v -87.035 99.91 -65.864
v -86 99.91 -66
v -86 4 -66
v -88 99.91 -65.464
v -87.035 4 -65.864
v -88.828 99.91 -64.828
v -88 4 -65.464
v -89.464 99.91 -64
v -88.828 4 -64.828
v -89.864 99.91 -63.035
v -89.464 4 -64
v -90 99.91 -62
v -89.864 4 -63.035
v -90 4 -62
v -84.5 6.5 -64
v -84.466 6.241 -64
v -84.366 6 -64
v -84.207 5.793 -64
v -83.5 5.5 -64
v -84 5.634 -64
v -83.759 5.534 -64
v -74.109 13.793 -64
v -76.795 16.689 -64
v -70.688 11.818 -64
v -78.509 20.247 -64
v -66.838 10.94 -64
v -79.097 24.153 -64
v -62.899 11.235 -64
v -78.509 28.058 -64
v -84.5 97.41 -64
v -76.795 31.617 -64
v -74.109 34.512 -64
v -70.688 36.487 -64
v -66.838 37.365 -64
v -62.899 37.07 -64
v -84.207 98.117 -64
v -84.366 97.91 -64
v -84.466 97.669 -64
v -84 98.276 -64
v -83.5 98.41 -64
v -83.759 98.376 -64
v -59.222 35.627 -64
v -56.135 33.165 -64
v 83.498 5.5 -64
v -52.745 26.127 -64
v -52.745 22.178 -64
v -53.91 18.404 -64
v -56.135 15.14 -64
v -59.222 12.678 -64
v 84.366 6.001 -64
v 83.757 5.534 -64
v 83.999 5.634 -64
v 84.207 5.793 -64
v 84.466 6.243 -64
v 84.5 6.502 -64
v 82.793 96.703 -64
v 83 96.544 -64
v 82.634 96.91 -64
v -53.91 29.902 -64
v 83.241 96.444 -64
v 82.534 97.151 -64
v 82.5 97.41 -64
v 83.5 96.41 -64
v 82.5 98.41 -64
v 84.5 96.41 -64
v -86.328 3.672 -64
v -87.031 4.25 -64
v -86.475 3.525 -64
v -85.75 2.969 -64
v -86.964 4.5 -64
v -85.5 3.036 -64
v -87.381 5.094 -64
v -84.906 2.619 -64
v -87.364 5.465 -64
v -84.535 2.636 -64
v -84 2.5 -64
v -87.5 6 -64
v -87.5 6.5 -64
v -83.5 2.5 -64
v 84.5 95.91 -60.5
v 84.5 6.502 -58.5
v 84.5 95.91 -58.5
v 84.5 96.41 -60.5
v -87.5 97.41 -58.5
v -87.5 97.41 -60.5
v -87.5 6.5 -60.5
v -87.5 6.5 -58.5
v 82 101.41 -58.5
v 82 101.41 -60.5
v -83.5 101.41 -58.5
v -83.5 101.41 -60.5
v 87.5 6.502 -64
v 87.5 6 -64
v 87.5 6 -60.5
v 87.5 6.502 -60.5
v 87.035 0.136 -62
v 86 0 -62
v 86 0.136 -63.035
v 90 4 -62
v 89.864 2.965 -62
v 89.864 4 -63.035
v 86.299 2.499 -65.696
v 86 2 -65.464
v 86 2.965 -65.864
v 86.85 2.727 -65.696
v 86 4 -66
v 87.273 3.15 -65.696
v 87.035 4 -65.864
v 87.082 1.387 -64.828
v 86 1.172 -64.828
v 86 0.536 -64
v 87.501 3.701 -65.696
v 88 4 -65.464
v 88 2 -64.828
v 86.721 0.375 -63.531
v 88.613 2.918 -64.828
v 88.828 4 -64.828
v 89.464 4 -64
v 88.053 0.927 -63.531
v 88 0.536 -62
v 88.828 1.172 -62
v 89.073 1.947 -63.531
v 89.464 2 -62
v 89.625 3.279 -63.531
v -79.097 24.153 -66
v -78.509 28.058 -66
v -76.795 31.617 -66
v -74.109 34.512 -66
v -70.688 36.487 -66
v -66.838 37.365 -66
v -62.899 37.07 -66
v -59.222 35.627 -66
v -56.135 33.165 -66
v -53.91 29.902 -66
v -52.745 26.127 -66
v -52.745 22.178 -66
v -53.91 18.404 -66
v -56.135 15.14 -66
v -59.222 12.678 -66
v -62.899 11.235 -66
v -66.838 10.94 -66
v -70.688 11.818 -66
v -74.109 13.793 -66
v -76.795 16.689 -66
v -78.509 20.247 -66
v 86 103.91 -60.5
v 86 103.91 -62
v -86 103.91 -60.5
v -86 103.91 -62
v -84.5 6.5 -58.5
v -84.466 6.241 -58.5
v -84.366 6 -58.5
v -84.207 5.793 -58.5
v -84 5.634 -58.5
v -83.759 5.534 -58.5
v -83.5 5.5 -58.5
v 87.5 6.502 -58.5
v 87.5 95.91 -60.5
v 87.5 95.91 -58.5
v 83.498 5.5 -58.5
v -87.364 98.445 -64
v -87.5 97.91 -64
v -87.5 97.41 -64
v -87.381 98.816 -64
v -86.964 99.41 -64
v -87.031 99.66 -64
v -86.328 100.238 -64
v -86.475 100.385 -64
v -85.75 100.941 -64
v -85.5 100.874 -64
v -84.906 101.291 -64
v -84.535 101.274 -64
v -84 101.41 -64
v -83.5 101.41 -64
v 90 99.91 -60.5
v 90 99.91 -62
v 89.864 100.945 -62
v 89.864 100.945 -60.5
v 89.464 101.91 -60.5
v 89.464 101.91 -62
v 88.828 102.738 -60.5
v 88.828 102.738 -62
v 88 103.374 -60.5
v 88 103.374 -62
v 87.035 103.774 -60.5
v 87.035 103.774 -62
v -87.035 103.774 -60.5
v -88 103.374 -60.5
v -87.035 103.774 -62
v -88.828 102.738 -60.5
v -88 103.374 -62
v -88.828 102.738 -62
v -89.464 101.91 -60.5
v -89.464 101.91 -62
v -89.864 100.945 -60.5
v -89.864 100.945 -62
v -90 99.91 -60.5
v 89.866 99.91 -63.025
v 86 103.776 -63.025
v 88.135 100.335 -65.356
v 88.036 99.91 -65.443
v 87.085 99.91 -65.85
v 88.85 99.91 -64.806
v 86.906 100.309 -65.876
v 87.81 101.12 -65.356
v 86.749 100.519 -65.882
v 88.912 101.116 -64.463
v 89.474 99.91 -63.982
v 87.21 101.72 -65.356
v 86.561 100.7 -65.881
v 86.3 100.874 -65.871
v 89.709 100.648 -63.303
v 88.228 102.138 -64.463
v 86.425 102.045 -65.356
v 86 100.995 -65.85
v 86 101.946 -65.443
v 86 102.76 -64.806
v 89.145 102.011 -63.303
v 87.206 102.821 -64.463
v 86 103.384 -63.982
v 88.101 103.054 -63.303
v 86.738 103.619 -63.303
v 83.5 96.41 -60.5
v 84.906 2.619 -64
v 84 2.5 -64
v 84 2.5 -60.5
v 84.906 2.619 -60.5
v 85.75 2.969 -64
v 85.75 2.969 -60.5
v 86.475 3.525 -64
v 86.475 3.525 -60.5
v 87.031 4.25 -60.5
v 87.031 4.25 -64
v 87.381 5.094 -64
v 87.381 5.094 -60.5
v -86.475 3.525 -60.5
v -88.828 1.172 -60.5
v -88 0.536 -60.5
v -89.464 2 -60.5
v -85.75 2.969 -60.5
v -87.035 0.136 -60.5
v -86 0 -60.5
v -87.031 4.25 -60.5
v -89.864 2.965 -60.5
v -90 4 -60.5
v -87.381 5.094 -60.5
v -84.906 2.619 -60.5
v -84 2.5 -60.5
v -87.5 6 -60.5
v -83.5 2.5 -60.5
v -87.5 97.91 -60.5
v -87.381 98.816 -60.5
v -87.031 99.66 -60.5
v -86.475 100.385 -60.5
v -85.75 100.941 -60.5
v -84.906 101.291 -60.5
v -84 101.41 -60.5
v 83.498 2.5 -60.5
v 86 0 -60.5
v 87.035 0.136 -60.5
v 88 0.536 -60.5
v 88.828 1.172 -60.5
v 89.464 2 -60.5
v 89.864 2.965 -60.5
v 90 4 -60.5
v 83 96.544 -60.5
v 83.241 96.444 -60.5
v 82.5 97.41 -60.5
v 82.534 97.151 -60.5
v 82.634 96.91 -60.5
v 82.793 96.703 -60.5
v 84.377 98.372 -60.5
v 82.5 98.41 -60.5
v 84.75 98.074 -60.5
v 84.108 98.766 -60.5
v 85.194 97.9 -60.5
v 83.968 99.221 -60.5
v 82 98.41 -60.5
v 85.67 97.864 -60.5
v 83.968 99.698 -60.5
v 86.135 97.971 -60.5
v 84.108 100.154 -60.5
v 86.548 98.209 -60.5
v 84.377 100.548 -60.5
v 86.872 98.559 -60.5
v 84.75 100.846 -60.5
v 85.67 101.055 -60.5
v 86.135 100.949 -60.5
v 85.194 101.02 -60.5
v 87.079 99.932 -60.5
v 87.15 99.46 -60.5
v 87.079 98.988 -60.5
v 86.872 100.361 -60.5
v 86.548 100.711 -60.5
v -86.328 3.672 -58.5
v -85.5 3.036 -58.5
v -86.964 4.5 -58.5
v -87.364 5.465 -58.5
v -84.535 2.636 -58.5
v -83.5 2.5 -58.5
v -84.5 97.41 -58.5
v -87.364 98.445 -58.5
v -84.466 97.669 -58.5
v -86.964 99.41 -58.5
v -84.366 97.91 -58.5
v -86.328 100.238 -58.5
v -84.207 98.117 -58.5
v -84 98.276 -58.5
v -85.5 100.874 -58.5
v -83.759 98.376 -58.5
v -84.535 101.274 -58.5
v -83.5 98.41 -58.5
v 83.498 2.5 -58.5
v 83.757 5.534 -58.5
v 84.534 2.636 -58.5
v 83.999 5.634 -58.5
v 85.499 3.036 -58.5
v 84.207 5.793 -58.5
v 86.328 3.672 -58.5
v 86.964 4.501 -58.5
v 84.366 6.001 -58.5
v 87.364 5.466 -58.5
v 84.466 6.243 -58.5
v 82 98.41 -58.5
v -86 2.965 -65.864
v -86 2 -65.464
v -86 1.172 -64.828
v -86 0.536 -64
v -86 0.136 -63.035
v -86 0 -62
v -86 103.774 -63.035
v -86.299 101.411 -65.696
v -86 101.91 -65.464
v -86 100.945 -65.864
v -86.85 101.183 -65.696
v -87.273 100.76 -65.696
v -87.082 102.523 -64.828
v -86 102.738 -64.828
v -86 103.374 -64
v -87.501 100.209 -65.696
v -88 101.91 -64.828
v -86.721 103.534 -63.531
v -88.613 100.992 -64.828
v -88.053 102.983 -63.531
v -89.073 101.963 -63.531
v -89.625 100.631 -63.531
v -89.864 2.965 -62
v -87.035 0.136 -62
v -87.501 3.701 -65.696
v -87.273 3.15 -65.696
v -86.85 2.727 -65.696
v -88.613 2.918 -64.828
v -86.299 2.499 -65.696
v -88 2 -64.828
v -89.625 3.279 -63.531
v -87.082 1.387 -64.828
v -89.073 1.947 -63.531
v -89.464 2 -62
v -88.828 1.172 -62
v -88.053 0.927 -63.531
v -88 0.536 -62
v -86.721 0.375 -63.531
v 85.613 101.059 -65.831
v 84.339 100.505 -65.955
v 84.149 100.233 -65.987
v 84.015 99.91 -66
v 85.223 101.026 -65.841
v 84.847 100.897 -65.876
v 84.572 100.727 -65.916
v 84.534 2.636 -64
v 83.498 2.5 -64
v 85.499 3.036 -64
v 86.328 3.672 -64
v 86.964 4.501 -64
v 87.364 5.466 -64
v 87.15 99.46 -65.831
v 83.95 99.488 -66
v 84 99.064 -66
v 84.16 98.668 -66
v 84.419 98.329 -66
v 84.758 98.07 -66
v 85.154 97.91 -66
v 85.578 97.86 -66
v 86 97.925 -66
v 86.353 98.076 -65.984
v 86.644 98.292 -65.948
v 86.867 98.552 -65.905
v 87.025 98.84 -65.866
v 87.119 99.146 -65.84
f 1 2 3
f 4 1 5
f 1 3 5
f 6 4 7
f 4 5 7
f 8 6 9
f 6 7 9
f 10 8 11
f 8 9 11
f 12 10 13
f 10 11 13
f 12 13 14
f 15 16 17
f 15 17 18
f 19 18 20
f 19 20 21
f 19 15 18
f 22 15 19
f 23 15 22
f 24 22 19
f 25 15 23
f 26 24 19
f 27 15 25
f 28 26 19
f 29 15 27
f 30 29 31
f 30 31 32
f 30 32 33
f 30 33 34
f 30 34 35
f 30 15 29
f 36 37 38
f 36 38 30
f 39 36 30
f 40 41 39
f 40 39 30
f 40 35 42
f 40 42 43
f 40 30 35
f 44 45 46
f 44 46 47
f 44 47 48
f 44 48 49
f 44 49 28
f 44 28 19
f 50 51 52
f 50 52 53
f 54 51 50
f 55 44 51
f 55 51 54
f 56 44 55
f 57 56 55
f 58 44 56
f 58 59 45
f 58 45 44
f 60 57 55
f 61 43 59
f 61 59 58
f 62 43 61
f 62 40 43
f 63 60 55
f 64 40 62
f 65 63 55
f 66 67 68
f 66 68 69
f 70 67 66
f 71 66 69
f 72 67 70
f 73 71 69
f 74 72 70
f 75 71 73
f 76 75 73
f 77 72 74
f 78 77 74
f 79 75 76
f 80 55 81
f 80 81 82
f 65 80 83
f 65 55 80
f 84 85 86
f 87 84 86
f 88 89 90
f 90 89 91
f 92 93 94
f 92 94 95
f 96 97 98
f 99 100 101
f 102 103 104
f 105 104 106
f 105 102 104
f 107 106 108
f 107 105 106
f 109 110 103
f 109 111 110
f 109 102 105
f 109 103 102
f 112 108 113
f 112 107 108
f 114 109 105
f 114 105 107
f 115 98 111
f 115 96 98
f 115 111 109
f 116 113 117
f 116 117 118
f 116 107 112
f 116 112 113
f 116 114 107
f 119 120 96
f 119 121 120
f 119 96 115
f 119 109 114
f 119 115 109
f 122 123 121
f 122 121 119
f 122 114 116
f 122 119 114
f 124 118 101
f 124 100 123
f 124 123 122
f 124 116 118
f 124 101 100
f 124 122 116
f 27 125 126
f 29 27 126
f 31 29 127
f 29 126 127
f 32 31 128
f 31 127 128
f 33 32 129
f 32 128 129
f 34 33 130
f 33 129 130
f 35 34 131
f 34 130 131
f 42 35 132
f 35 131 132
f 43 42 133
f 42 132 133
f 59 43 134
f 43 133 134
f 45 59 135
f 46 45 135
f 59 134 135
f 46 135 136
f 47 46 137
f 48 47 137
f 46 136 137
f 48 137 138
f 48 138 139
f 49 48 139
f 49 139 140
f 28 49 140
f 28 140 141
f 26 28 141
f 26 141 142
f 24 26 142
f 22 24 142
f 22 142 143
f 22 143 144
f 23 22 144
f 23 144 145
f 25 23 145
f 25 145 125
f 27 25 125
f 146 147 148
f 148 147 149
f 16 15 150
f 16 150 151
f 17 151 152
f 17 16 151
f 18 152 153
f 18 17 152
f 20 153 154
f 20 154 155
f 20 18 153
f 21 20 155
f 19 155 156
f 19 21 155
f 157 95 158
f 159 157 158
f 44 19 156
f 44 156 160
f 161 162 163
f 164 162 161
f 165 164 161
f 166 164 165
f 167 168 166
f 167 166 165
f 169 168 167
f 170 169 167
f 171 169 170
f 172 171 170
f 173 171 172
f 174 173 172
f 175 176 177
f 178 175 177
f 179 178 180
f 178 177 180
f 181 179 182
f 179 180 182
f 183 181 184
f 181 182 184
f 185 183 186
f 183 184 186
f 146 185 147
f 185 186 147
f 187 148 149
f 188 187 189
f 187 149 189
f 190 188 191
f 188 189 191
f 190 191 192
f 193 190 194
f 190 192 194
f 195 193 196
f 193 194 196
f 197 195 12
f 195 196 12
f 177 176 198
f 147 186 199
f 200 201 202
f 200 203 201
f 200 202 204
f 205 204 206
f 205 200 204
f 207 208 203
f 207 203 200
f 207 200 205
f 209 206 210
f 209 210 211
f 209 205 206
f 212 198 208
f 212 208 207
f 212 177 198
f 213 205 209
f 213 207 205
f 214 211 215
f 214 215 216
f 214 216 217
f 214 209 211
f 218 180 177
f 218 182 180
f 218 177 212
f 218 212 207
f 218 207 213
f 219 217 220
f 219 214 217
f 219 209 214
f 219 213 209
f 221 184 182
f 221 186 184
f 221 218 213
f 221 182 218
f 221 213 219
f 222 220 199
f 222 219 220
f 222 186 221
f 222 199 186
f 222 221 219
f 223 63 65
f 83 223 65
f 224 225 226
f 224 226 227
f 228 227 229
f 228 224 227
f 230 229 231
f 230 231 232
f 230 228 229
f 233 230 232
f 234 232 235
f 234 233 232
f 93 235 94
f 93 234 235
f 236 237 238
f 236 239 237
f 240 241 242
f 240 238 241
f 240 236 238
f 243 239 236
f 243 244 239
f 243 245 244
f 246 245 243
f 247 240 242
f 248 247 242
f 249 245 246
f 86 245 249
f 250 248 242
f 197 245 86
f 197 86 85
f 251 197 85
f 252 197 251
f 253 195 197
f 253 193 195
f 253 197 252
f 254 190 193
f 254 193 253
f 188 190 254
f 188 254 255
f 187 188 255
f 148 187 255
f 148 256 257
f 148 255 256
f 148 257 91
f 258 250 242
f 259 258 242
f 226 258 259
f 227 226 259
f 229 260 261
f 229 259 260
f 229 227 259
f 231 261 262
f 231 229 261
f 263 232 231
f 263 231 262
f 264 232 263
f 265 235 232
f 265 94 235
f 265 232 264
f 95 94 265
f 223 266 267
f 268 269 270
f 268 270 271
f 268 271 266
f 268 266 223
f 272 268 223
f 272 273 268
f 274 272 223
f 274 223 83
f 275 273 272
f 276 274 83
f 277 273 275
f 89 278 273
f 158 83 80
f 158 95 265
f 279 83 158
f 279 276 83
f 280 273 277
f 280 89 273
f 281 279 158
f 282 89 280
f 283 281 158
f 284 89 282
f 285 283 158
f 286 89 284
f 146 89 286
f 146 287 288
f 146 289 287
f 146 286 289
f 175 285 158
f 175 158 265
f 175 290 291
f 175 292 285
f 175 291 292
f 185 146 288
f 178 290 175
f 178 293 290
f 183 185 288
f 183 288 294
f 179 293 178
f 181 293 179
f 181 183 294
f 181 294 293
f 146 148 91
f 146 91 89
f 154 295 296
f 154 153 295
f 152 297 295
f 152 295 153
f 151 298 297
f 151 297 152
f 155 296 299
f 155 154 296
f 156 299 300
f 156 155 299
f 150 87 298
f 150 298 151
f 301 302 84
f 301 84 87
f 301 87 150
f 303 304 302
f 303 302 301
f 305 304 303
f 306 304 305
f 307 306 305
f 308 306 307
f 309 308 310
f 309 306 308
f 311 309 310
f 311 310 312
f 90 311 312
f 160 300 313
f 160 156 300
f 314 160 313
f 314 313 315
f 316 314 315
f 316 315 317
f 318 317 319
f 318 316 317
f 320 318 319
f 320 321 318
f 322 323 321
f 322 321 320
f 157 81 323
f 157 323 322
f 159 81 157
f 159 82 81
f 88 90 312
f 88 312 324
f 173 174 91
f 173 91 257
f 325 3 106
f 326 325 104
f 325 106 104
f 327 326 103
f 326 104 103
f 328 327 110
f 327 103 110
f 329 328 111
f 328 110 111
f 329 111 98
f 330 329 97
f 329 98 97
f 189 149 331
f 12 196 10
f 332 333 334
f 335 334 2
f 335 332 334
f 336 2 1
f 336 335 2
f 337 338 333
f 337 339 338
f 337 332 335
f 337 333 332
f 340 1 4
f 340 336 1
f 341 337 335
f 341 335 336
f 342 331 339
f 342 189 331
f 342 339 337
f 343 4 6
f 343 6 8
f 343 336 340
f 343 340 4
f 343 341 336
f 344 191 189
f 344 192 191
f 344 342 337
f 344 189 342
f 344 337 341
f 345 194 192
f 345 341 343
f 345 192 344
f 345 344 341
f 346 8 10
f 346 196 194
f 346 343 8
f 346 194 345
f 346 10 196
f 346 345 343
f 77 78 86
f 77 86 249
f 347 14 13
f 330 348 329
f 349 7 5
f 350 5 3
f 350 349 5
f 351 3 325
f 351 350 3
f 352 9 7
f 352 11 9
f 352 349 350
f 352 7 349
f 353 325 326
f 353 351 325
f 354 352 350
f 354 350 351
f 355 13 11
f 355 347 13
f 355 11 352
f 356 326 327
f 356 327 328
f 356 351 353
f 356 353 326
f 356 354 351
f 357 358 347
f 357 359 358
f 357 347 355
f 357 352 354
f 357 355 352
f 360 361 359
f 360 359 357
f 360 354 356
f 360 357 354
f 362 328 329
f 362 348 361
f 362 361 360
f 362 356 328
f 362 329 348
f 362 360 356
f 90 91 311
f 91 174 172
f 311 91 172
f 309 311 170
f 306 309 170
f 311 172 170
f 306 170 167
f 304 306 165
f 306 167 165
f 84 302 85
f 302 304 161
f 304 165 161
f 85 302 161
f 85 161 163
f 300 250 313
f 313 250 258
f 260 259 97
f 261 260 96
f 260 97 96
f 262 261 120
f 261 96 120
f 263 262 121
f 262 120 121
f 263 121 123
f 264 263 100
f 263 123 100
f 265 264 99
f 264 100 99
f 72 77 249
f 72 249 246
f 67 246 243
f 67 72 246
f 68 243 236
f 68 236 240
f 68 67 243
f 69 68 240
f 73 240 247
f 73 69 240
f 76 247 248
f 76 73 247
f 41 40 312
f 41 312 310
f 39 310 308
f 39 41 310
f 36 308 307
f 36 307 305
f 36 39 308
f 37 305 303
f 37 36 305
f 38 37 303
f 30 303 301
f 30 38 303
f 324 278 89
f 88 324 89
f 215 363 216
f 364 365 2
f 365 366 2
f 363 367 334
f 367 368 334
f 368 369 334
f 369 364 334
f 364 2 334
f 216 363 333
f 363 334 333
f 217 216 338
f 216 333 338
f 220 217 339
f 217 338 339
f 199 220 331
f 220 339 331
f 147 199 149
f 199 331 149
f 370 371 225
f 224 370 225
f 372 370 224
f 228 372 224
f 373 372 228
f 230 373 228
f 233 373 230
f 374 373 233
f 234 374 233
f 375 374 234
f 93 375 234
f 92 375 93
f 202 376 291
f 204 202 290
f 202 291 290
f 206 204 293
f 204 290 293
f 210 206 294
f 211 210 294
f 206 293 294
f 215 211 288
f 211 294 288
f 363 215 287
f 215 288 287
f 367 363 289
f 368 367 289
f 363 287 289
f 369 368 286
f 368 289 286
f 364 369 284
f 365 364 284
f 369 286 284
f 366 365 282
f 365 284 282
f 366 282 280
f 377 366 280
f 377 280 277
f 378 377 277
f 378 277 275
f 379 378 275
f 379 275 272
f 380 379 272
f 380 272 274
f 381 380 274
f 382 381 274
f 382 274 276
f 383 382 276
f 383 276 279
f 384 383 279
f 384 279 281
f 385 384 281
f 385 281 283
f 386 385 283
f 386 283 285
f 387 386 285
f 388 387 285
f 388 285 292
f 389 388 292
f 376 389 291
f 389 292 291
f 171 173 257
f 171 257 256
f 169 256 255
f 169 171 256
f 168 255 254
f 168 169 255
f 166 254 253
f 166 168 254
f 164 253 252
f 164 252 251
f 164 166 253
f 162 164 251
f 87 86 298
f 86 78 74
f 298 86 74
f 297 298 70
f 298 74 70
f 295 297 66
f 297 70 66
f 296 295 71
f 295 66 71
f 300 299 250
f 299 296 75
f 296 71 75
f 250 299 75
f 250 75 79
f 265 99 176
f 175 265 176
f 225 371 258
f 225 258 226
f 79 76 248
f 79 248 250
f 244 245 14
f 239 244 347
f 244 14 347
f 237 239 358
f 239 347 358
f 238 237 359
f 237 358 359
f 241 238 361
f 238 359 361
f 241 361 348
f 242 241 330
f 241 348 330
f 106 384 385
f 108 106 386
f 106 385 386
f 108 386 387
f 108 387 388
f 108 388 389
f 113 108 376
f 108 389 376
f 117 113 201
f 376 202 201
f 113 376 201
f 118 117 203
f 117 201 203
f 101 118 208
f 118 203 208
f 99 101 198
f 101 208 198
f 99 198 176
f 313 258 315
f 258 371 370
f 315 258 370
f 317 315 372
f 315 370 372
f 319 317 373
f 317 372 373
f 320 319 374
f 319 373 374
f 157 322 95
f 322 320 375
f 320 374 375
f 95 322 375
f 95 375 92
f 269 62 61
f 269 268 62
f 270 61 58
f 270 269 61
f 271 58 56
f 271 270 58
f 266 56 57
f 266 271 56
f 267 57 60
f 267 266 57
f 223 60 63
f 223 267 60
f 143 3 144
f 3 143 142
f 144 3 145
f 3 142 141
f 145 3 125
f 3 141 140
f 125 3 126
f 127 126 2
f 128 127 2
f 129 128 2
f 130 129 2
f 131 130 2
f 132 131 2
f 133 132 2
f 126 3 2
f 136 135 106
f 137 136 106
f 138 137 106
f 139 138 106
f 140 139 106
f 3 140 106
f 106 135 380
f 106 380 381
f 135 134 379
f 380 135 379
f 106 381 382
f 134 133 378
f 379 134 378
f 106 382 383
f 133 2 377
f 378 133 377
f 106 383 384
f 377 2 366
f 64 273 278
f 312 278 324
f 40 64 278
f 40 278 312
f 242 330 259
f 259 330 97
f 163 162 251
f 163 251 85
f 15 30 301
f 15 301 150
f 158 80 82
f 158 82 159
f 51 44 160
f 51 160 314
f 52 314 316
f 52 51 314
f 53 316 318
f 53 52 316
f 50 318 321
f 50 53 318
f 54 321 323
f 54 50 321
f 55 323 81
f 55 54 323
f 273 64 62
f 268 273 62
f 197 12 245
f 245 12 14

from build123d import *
from OCP.BRepFilletAPI import BRepFilletAPI_MakeChamfer

# Parameters (mm, degrees)
SKETCH1_W            = 180
SKETCH1_H            = 120
BOSS_EXTRUDE1_DEPTH  = 20
BOSS_EXTRUDE2_DEPTH  = 180
SHELL3_T             = -2
FILLET1_R            = 4
FILLET2_R            = 4
BOSS_EXTRUDE3_DEPTH  = 2.5
SKETCH14_R           = 1.6
CUT_EXTRUDE10_DEPTH  = 3.2
CUT_EXTRUDE3_REACH   = 151.991
SKETCH7_W            = 14
SKETCH7_H            = 9
SKETCH8_R            = 1.35
BOSS_EXTRUDE4_DEPTH  = 5
SKETCH8_3_W          = 97.5
SKETCH8_3_H          = 40.5
CUT_EXTRUDE4_DEPTH   = 5
SKETCH9_W            = 50.8
SKETCH9_H            = 19.5
CUT_EXTRUDE5_DEPTH   = 5
SKETCH10_R           = 2.525
CUT_EXTRUDE6_DEPTH   = 5
SKETCH11_R           = 6.125
CUT_EXTRUDE7_DEPTH   = 5
CUT_EXTRUDE8_DEPTH   = 5
FILLET4_R            = 1.5
SKETCH13_W           = 22
SKETCH13_H           = 10
CUT_EXTRUDE9_DEPTH   = 5
CHAMFER1_SIZE        = 9.330127019
CHAMFER1_SIZE_2      = 2.5
SKETCH15_W           = 9
SKETCH15_H           = 14
CUT_EXTRUDE11_DEPTH  = 3.2
SKETCH16_R           = 3.5
CUT_EXTRUDE12_DEPTH  = 3.2
SKETCH17_R           = 7
SKETCH17_R_2         = 6
BOSS_EXTRUDE5_DEPTH  = 0.5
FILLET7_R            = 0.5
CUT_EXTRUDE13_DEPTH  = 1
FILLET8_R            = 1
SKETCH19_W           = 7.5
SKETCH19_H           = 5.2
SKETCH19_W_2         = 6.5
SKETCH19_H_2         = 6.5
CUT_EXTRUDE14_DEPTH  = 1.2
BOSS_EXTRUDE6_START  = 4
BOSS_EXTRUDE6_DEPTH  = 4
BOSS_EXTRUDE7_START  = 2
BOSS_EXTRUDE7_DEPTH  = 2
FILLET9_R            = 4
CUT_EXTRUDE18_REACH  = 220.067
BOSS_EXTRUDE8_DEPTH  = 3.5
BOSS_EXTRUDE10_DEPTH = 5.5
BOSS_EXTRUDE12_START = -3.5
BOSS_EXTRUDE12_DEPTH = 3.5
CUT_EXTRUDE21_DEPTH  = 54
SKETCH31_R           = 1.6
CUT_EXTRUDE22_DEPTH  = 54
FILLET11_R           = 1
SKETCH32_R           = 13.25
CUT_EXTRUDE23_DEPTH  = 10


# Read off the part's stored shape, not the designer's step: Boss-Extrude12
with BuildPart() as part:
    # Sketch1 → Boss-Extrude1 (new body)
    with BuildSketch(Plane(origin=(0, 0, 0), x_dir=(1, 0, 0), z_dir=(0, 1, 0))):
        Rectangle(SKETCH1_W, SKETCH1_H)
    extrude(amount=BOSS_EXTRUDE1_DEPTH)

    # Sketch2 → Boss-Extrude2 (add)
    with BuildSketch(Plane.ZY.offset(90)):
        Polygon((60, 20), (-40, 103.909963118), (-60, 103.909963118), (-60, 20), align=None)
    extrude(amount=-BOSS_EXTRUDE2_DEPTH)

    # Shell3
    shell3_openings = [part.faces().sort_by_distance(p)[0] for p in [
        (0, 51.954981559, -60),
    ]]
    offset(amount=SHELL3_T, openings=shell3_openings, kind=Kind.INTERSECTION)

    # Fillet1
    fillet1_edges = [part.edges().sort_by_distance(p)[0] for p in [
        (0, 20, 60),
        (0, 103.909963118, -40),
        (-90, 61.954981559, 10),
        (-90, 103.909963118, -50),
        (90, 103.909963118, -50),
        (90, 61.954981559, 10),
        (0, 0, 60),
        (-90, 0, 0),
        (90, 0, 0),
        (90, 10, 60),
        (-90, 10, 60),
    ]]
    fillet(fillet1_edges, radius=FILLET1_R)

    # Fillet2
    fillet2_edges = [part.edges().sort_by_distance(p)[0] for p in [
        (88, 2, -1),
        (88, 101.909963118, -50.363970234),
        (88, 60.488673901, 8.636029766),
        (88, 10.533692342, 58),
        (-88, 2, -1),
        (-88, 60.488673901, 8.636029766),
        (-88, 101.909963118, -50.363970234),
        (0, 2, 58),
        (-88, 10.533692342, 58),
        (0, 101.909963118, -40.727940469),
        (0, 19.067384684, 58),
    ]]
    fillet(fillet2_edges, radius=FILLET2_R)

    # Sketch4 → Boss-Extrude3 (add)
    with BuildSketch(Plane(origin=(0, 2, 0), x_dir=(1, 0, 0), z_dir=(0, 1, 0))):
        Polygon((34.175426481, -3.50047313), (32.58771324, -0.75047313), (29.41228676, -0.75047313), (27.824573519, -3.50047313), (29.41228676, -6.25047313), (32.58771324, -6.25047313), align=None)
        Polygon((32.58771324, 41.24952687), (34.175426481, 38.49952687), (32.58771324, 35.74952687), (29.41228676, 35.74952687), (27.824573519, 38.49952687), (29.41228676, 41.24952687), align=None)
        Polygon((-29.41228676, 41.24952687), (-32.58771324, 41.24952687), (-34.175426481, 38.49952687), (-32.58771324, 35.74952687), (-29.41228676, 35.74952687), (-27.824573519, 38.49952687), align=None)
        Polygon((-32.58771324, -6.25047313), (-34.175426481, -3.50047313), (-32.58771324, -0.75047313), (-29.41228676, -0.75047313), (-27.824573519, -3.50047313), (-29.41228676, -6.25047313), align=None)
    extrude(amount=BOSS_EXTRUDE3_DEPTH)

    # Sketch14 → Cut-Extrude10 (cut)
    with BuildSketch(Plane(origin=(0, 4.5, 0), x_dir=(1, 0, 0), z_dir=(0, 1, 0))):
        with Locations(Location((31, 38.49952687, 0), (0, 0, 270))):
            Circle(SKETCH14_R)
        with Locations(Location((-31, -3.50047313, 0), (0, 0, 90))):
            Circle(SKETCH14_R)
        with Locations(Location((-31, 38.49952687, 0), (0, 0, 270))):
            Circle(SKETCH14_R)
        with Locations(Location((31, -3.50047313, 0), (0, 0, 270))):
            Circle(SKETCH14_R)
    extrude(amount=-CUT_EXTRUDE10_DEPTH, mode=Mode.SUBTRACT)

    # Sketch7 → Cut-Extrude3 (cut, up to next)
    with BuildSketch(Plane(origin=(0, 103.909963118, 0), x_dir=(1, 0, 0), z_dir=(0, 1, 0)), mode=Mode.PRIVATE) as cut_extrude3_sk1:
        with Locations((-63, 50.727940469)):
            Rectangle(SKETCH7_W, SKETCH7_H)
    cut_extrude3_tool1 = extrude(cut_extrude3_sk1.sketch, amount=-CUT_EXTRUDE3_REACH, mode=Mode.PRIVATE) & part.part
    add(cut_extrude3_tool1.solids().sort_by_distance((-63, 103.909963, -50.72794))[0], mode=Mode.SUBTRACT)

    # Sketch8 → Boss-Extrude4 (add)
    with BuildSketch(Plane(origin=(0, 41.280714367, 34.6386322), x_dir=(1, 0, 0), z_dir=(0, 0.766044443118982, 0.6427876096865347))):
        with Locations(Location((-73.5, 93.477933603, 0), (0, 0, 270))):
            Circle(SKETCH8_R)
        with Locations(Location((-73.5, 37.977933603, 0), (0, 0, 270))):
            Circle(SKETCH8_R)
        with Locations(Location((19, 37.977933603, 0), (0, 0, 270))):
            Circle(SKETCH8_R)
        with Locations(Location((19, 93.477933603, 0), (0, 0, 270))):
            Circle(SKETCH8_R)
    extrude(amount=-BOSS_EXTRUDE4_DEPTH)

    # Sketch8<3> → Cut-Extrude4 (cut)
    with BuildSketch(Plane(origin=(0, 41.280714367, 34.6386322), x_dir=(1, 0, 0), z_dir=(0, 0.766044443118982, 0.6427876096865347))):
        with Locations((-27.25, 65.727933603)):
            Rectangle(SKETCH8_3_W, SKETCH8_3_H)
    extrude(amount=-CUT_EXTRUDE4_DEPTH, mode=Mode.SUBTRACT)

    # Sketch9 → Cut-Extrude5 (cut)
    with BuildSketch(Plane(origin=(0, 41.280714367, 34.6386322), x_dir=(1, 0, 0), z_dir=(0, 0.766044443118982, 0.6427876096865347))):
        with Locations((-50.6, 20.727933603)):
            Rectangle(SKETCH9_W, SKETCH9_H)
    extrude(amount=-CUT_EXTRUDE5_DEPTH, mode=Mode.SUBTRACT)

    # Sketch10 → Cut-Extrude6 (cut)
    with BuildSketch(Plane(origin=(0, 41.280714367, 34.6386322), x_dir=(1, 0, 0), z_dir=(0, 0.766044443118982, 0.6427876096865347))):
        with Locations(Location((-13.525, 20.727933603, 0), (0, 0, 270))):
            Circle(SKETCH10_R)
        with Locations(Location((-1.85, 20.727933603, 0), (0, 0, 270))):
            Circle(SKETCH10_R)
        with Locations(Location((9.825, 20.727933603, 0), (0, 0, 270))):
            Circle(SKETCH10_R)
    extrude(amount=-CUT_EXTRUDE6_DEPTH, mode=Mode.SUBTRACT)

    # Sketch11 → Cut-Extrude7 (cut)
    with BuildSketch(Plane(origin=(0, 41.280714367, 34.6386322), x_dir=(1, 0, 0), z_dir=(0, 0.766044443118982, 0.6427876096865347))):
        with Locations(Location((37.625, 60.977933603, 0), (0, 0, 270))):
            Circle(SKETCH11_R)
        with BuildLine():
            ThreePointArc((76, 60.977933603), (74.206029035, 65.308962638), (69.875, 67.102933603))
            Line((69.875, 67.102933603), (69.875, 54.852933603))
            ThreePointArc((69.875, 54.852933603), (74.206029035, 56.646904568), (76, 60.977933603))
        make_face()
        with BuildLine():
            Line((69.875, 54.852933603), (69.875, 67.102933603))
            ThreePointArc((69.875, 67.102933603), (63.75, 60.977933603), (69.875, 54.852933603))
        make_face()
    extrude(amount=-CUT_EXTRUDE7_DEPTH, mode=Mode.SUBTRACT)

    # Sketch12 → Cut-Extrude8 (cut)
    with BuildSketch(Plane(origin=(0, 41.280714367, 34.6386322), x_dir=(1, 0, 0), z_dir=(0, 0.766044443118982, 0.6427876096865347))):
        with BuildLine():
            ThreePointArc((-76, -10.131875079), (-66, -20.131875079), (-56, -10.131875079))
            Line((-56, -10.131875079), (-76, -10.131875079))
        make_face()
        with BuildLine():
            Line((-76, -10.131875079), (-56, -10.131875079))
            ThreePointArc((-56, -10.131875079), (-66, -0.131875079), (-76, -10.131875079))
        make_face()
        with BuildLine():
            ThreePointArc((-25.2, -10.131875079), (-35.2, -0.131875079), (-45.2, -10.131875079))
            Line((-45.2, -10.131875079), (-25.2, -10.131875079))
        make_face()
        with BuildLine():
            Line((-25.2, -10.131875079), (-45.2, -10.131875079))
            ThreePointArc((-45.2, -10.131875079), (-35.2, -20.131875079), (-25.2, -10.131875079))
        make_face()
    extrude(amount=-CUT_EXTRUDE8_DEPTH, mode=Mode.SUBTRACT)

    # Fillet4
    fillet4_edges = [part.edges().sort_by_distance(p)[0] for p in [
        (-45.2, 33.235981717, 41.114523583),
        (-76, 33.235981717, 41.114523583),
    ]]
    fillet(fillet4_edges, radius=FILLET4_R)

    # Sketch13 → Cut-Extrude9 (cut)
    with BuildSketch(Plane(origin=(0, 41.280714367, 34.6386322), x_dir=(1, 0, 0), z_dir=(0, 0.766044443118982, 0.6427876096865347))):
        with Locations((-1.85, -0.131875079)):
            Rectangle(SKETCH13_W, SKETCH13_H)
        with Locations((-1.85, -20.131875079)):
            Rectangle(SKETCH13_W, SKETCH13_H)
    extrude(amount=-CUT_EXTRUDE9_DEPTH, mode=Mode.SUBTRACT)

    # Chamfer1
    chamfer1_edges_1 = [part.edges().sort_by_distance(p)[0] for p in [
        (-28.61843014, 2, 4.87547313),
    ]]
    chamfer1_side_1 = [part.faces().sort_by_distance(p)[0] for p in [
        (-28.575128869, 2, 4.90047313),
    ]]
    chamfer1_edges_2 = [part.edges().sort_by_distance(p)[0] for p in [
        (-31, 2, 6.25047313),
    ]]
    chamfer1_side_2 = [part.faces().sort_by_distance(p)[0] for p in [
        (-31, 2, 6.30047313),
    ]]
    chamfer1_edges_3 = [part.edges().sort_by_distance(p)[0] for p in [
        (-33.38156986, 2, 4.87547313),
    ]]
    chamfer1_side_3 = [part.faces().sort_by_distance(p)[0] for p in [
        (-33.424871131, 2, 4.90047313),
    ]]
    chamfer1_edges_4 = [part.edges().sort_by_distance(p)[0] for p in [
        (-33.38156986, 2, -37.12452687),
    ]]
    chamfer1_side_4 = [part.faces().sort_by_distance(p)[0] for p in [
        (-33.424871131, 2, -37.09952687),
    ]]
    chamfer1_edges_5 = [part.edges().sort_by_distance(p)[0] for p in [
        (-31, 2, -35.74952687),
    ]]
    chamfer1_side_5 = [part.faces().sort_by_distance(p)[0] for p in [
        (-31, 2, -35.69952687),
    ]]
    chamfer1_edges_6 = [part.edges().sort_by_distance(p)[0] for p in [
        (-28.61843014, 2, -37.12452687),
    ]]
    chamfer1_side_6 = [part.faces().sort_by_distance(p)[0] for p in [
        (-28.575128869, 2, -37.09952687),
    ]]
    chamfer1_edges_7 = [part.edges().sort_by_distance(p)[0] for p in [
        (28.61843014, 2, -37.12452687),
    ]]
    chamfer1_side_7 = [part.faces().sort_by_distance(p)[0] for p in [
        (28.575128869, 2, -37.09952687),
    ]]
    chamfer1_edges_8 = [part.edges().sort_by_distance(p)[0] for p in [
        (31, 2, -35.74952687),
    ]]
    chamfer1_side_8 = [part.faces().sort_by_distance(p)[0] for p in [
        (31, 2, -35.69952687),
    ]]
    chamfer1_edges_9 = [part.edges().sort_by_distance(p)[0] for p in [
        (33.38156986, 2, -37.12452687),
    ]]
    chamfer1_side_9 = [part.faces().sort_by_distance(p)[0] for p in [
        (33.424871131, 2, -37.09952687),
    ]]
    chamfer1_edges_10 = [part.edges().sort_by_distance(p)[0] for p in [
        (33.38156986, 2, 4.87547313),
    ]]
    chamfer1_side_10 = [part.faces().sort_by_distance(p)[0] for p in [
        (33.424871131, 2, 4.90047313),
    ]]
    chamfer1_edges_11 = [part.edges().sort_by_distance(p)[0] for p in [
        (28.61843014, 2, 4.87547313),
    ]]
    chamfer1_side_11 = [part.faces().sort_by_distance(p)[0] for p in [
        (28.575128869, 2, 4.90047313),
    ]]
    chamfer1_edges_12 = [part.edges().sort_by_distance(p)[0] for p in [
        (31, 2, 6.25047313),
    ]]
    chamfer1_side_12 = [part.faces().sort_by_distance(p)[0] for p in [
        (31, 2, 6.30047313),
    ]]
    chamfer1 = BRepFilletAPI_MakeChamfer(part.part.solid().wrapped)
    for e in chamfer1_edges_1:
        chamfer1.Add(CHAMFER1_SIZE - 0.0001, CHAMFER1_SIZE_2 - 0.0001, e.wrapped, chamfer1_side_1[0].wrapped)
    for e in chamfer1_edges_2:
        chamfer1.Add(CHAMFER1_SIZE - 0.0001, CHAMFER1_SIZE_2 - 0.0001, e.wrapped, chamfer1_side_2[0].wrapped)
    for e in chamfer1_edges_3:
        chamfer1.Add(CHAMFER1_SIZE - 0.0001, CHAMFER1_SIZE_2 - 0.0001, e.wrapped, chamfer1_side_3[0].wrapped)
    for e in chamfer1_edges_4:
        chamfer1.Add(CHAMFER1_SIZE - 0.0001, CHAMFER1_SIZE_2 - 0.0001, e.wrapped, chamfer1_side_4[0].wrapped)
    for e in chamfer1_edges_5:
        chamfer1.Add(CHAMFER1_SIZE - 0.0001, CHAMFER1_SIZE_2 - 0.0001, e.wrapped, chamfer1_side_5[0].wrapped)
    for e in chamfer1_edges_6:
        chamfer1.Add(CHAMFER1_SIZE - 0.0001, CHAMFER1_SIZE_2 - 0.0001, e.wrapped, chamfer1_side_6[0].wrapped)
    for e in chamfer1_edges_7:
        chamfer1.Add(CHAMFER1_SIZE - 0.0001, CHAMFER1_SIZE_2 - 0.0001, e.wrapped, chamfer1_side_7[0].wrapped)
    for e in chamfer1_edges_8:
        chamfer1.Add(CHAMFER1_SIZE - 0.0001, CHAMFER1_SIZE_2 - 0.0001, e.wrapped, chamfer1_side_8[0].wrapped)
    for e in chamfer1_edges_9:
        chamfer1.Add(CHAMFER1_SIZE - 0.0001, CHAMFER1_SIZE_2 - 0.0001, e.wrapped, chamfer1_side_9[0].wrapped)
    for e in chamfer1_edges_10:
        chamfer1.Add(CHAMFER1_SIZE - 0.0001, CHAMFER1_SIZE_2 - 0.0001, e.wrapped, chamfer1_side_10[0].wrapped)
    for e in chamfer1_edges_11:
        chamfer1.Add(CHAMFER1_SIZE - 0.0001, CHAMFER1_SIZE_2 - 0.0001, e.wrapped, chamfer1_side_11[0].wrapped)
    for e in chamfer1_edges_12:
        chamfer1.Add(CHAMFER1_SIZE - 0.0001, CHAMFER1_SIZE_2 - 0.0001, e.wrapped, chamfer1_side_12[0].wrapped)
    add(Compound.cast(chamfer1.Shape()), mode=Mode.REPLACE)  # a hair under: the kernel refuses the full size

    # Sketch15 → Cut-Extrude11 (cut)
    with BuildSketch(Plane(origin=(0, 41.280714367, 34.6386322), x_dir=(1, 0, 0), z_dir=(0, 0.766044443118982, 0.6427876096865347))):
        with Locations((69.812284425, 22.683898911)):
            Rectangle(SKETCH15_W, SKETCH15_H)
        with Locations((53.870194494, 22.738966801)):
            Rectangle(SKETCH15_W, SKETCH15_H)
        with Locations((37.689197041, 22.832961961)):
            Rectangle(SKETCH15_W, SKETCH15_H)
    extrude(amount=-CUT_EXTRUDE11_DEPTH, mode=Mode.SUBTRACT)

    # Sketch16 → Cut-Extrude12 (cut)
    with BuildSketch(Plane(origin=(0, 41.280714367, 34.6386322), x_dir=(1, 0, 0), z_dir=(0, 0.766044443118982, 0.6427876096865347))):
        with Locations(Location((66.7875, -10.131875079, 0), (0, 0, 270))):
            Circle(SKETCH16_R)
        with Locations(Location((28.150317304, -10.131875079, 0), (0, 0, 270))):
            Circle(SKETCH16_R)
        with Locations(Location((47.575, -10.131875079, 0), (0, 0, 270))):
            Circle(SKETCH16_R)
    extrude(amount=-CUT_EXTRUDE12_DEPTH, mode=Mode.SUBTRACT)

    # Sketch17 → Boss-Extrude5 (add)
    # profile 1 of 4: a face of its own
    with BuildSketch(Plane.XZ):
        with Locations(Location((-78.221825407, 48.221825407, 0), (0, 0, 270))):
            Circle(SKETCH17_R)
        with Locations(Location((-78.221825407, 48.221825407, 0), (0, 0, 270))):
            Circle(SKETCH17_R_2, mode=Mode.SUBTRACT)
    # profile 2 of 4: a face of its own
    with BuildSketch(Plane.XZ):
        with Locations(Location((78.221825407, 48.221825407, 0), (0, 0, 270))):
            Circle(SKETCH17_R)
        with Locations(Location((78.221825407, 48.221825407, 0), (0, 0, 270))):
            Circle(SKETCH17_R_2, mode=Mode.SUBTRACT)
    # profile 3 of 4: a face of its own
    with BuildSketch(Plane.XZ):
        with Locations(Location((78.221825407, -51.278809632, 0), (0, 0, 270))):
            Circle(SKETCH17_R)
        with Locations(Location((78.221825407, -51.278809632, 0), (0, 0, 270))):
            Circle(SKETCH17_R_2, mode=Mode.SUBTRACT)
    # profile 4 of 4: a face of its own
    with BuildSketch(Plane.XZ):
        with Locations(Location((-78.221825407, -51.278809632, 0), (0, 0, 270))):
            Circle(SKETCH17_R)
        with Locations(Location((-78.221825407, -51.278809632, 0), (0, 0, 270))):
            Circle(SKETCH17_R_2, mode=Mode.SUBTRACT)
    extrude(amount=BOSS_EXTRUDE5_DEPTH)

    # Fillet7
    fillet7_edges = [part.edges().sort_by_distance(p)[0] for p in [
        (78.221825407, -0.5, -45.278809632),
        (78.221825407, -0.5, -44.278809632),
        (78.221825407, -0.5, 55.221825407),
        (78.221825407, -0.5, 54.221825407),
        (-78.221825407, -0.5, 54.221825407),
        (-78.221825407, -0.5, 55.221825407),
        (-78.221825407, -0.5, -44.278809632),
        (-78.221825407, -0.5, -45.278809632),
    ]]
    fillet(fillet7_edges, radius=FILLET7_R - 0.0001)  # a hair under: the kernel refuses the full size

    # Sketch18 → Cut-Extrude13 (cut)
    with BuildSketch(Plane.XZ.offset(-101.909963118)):
        Polygon((-51, -58), (79, -58), (79, -44.183821406), (-51, -44.183821406), (-51, -50.727940469), align=None)
    extrude(amount=-CUT_EXTRUDE13_DEPTH, mode=Mode.SUBTRACT)

    # Fillet8
    fillet8_edges = [part.edges().sort_by_distance(p)[0] for p in [
        (-51, 102.909963118, -51.091910703),
        (14, 102.909963118, -44.183821406),
        (79, 102.909963118, -51.091910703),
        (14, 102.909963118, -58),
    ]]
    fillet(fillet8_edges, radius=FILLET8_R - 0.0001)  # a hair under: the kernel refuses the full size

    # Sketch19 → Cut-Extrude14 (cut)
    with BuildSketch(Plane(origin=(0, 103.909963118, 0), x_dir=(1, 0, 0), z_dir=(0, 1, 0))):
        with Locations((-42.25, 50.727940469)):
            Rectangle(SKETCH19_W, SKETCH19_H)
        with Locations((-32.25, 50.727940469)):
            Rectangle(SKETCH19_W_2, SKETCH19_H_2)
        Polygon((-14, 50.727940469), (-14, 53.227940469), (74.4, 53.227940469), (74.4, 48.227940469), (-14, 48.227940469), align=None)
    extrude(amount=-CUT_EXTRUDE14_DEPTH, mode=Mode.SUBTRACT)

    # Sketch20 → Boss-Extrude6 (add)
    with BuildSketch(Plane(origin=(0, 0, -60), x_dir=(-1, 0, 0), z_dir=(0, 0, -1)).offset(BOSS_EXTRUDE6_START)):
        with BuildLine():
            Line((-86, 103.909963118), (86, 103.909963118))
            ThreePointArc((86, 103.909963118), (88.828427125, 102.738390242), (90, 99.909963118))
            Line((90, 99.909963118), (90, 4))
            ThreePointArc((90, 4), (88.828427125, 1.171572875), (86, 0))
            Line((86, 0), (-86, 0))
            ThreePointArc((-86, 0), (-88.828427125, 1.171572875), (-90, 4))
            Line((-90, 4), (-90, 99.909963118))
            ThreePointArc((-90, 99.909963118), (-88.828427125, 102.738390242), (-86, 103.909963118))
        make_face()
        with BuildLine():
            Line((-88, 97.909963118), (-88, 6))
            ThreePointArc((-88, 6), (-86.828427125, 3.171572875), (-84, 2))
            Line((-84, 2), (84, 2))
            ThreePointArc((84, 2), (86.828427125, 3.171572875), (88, 6))
            Line((88, 6), (88, 97.909963118))
            ThreePointArc((88, 97.909963118), (86.828427125, 100.738390242), (84, 101.909963118))
            Line((84, 101.909963118), (-84, 101.909963118))
            ThreePointArc((-84, 101.909963118), (-86.828427125, 100.738390242), (-88, 97.909963118))
        make_face(mode=Mode.SUBTRACT)
    extrude(amount=-BOSS_EXTRUDE6_DEPTH)

    # Sketch23 → Boss-Extrude7 (add)
    with BuildSketch(Plane(origin=(0, 0, -64), x_dir=(-1, 0, 0), z_dir=(0, 0, -1)).offset(BOSS_EXTRUDE7_START)):
        with BuildLine():
            Line((-86, 103.909963118), (86, 103.909963118))
            ThreePointArc((86, 103.909963118), (88.828427125, 102.738390242), (90, 99.909963118))
            Line((90, 99.909963118), (90, 4))
            ThreePointArc((90, 4), (88.828427125, 1.171572875), (86, 0))
            Line((86, 0), (-86, 0))
            ThreePointArc((-86, 0), (-88.828427125, 1.171572875), (-90, 4))
            Line((-90, 4), (-90, 99.909963118))
            ThreePointArc((-90, 99.909963118), (-88.828427125, 102.738390242), (-86, 103.909963118))
        make_face()
    extrude(amount=-BOSS_EXTRUDE7_DEPTH)

    # Fillet9
    fillet9_edges = [part.edges().sort_by_distance(p)[0] for p in [
        (88.828427125, 102.738390242, -66),
        (90, 51.954981559, -66),
        (88.828427125, 1.171572875, -66),
        (0, 0, -66),
        (-88.828427125, 1.171572875, -66),
        (-90, 51.954981559, -66),
        (-88.828427125, 102.738390242, -66),
        (0, 103.909963118, -66),
    ]]
    fillet(fillet9_edges, radius=FILLET9_R)

    # Cut-Extrude18: up to this face of the body (flat: up to its plane)
    cut_extrude18_end = Plane(part.part.faces().sort_by_distance((-90, 40.707947671, -17.408745232))[0])
    # Sketch25 → Cut-Extrude18 (cut, up to the picked face)
    with BuildSketch(Plane(origin=(90, 0, 0), x_dir=(0, 0, -1), z_dir=(1, 0, 0)), mode=Mode.PRIVATE) as cut_extrude18_sk1:
        Polygon((60.5, 103.909963118), (41.455880937, 103.909963118), (38.505766569, 103.909963118), (38.884730498, 102.97414089), (-58.571150439, 21.19894714), (-60.532827399, 20.404560357), (-60, 18.134769367), (-60, 4), (-60.2664137, 0), (-56.570989921, -1.575749733), (-39.460910692, -1.575749733), (-38.789002037, 0), (46.546103456, -2.451826891), (60.5, -1.899548411), (60.5, 0.282012763), align=None)
    cut_extrude18_tool1 = split(extrude(cut_extrude18_sk1.sketch, amount=-CUT_EXTRUDE18_REACH, mode=Mode.PRIVATE), bisect_by=cut_extrude18_end, keep=Keep.BOTH, mode=Mode.PRIVATE)
    add(cut_extrude18_tool1.solids().sort_by(Axis((90, 39.075645, -13.771373), (-1, 0, 0)))[0], mode=Mode.SUBTRACT)

    # Sketch26 → Boss-Extrude8 (add)
    with BuildSketch(Plane.XY.offset(-64)):
        with BuildLine():
            Line((-88, 97.909963118), (-88, 6))
            ThreePointArc((-88, 6), (-86.828427125, 3.171572875), (-84, 2))
            Line((-84, 2), (84, 2))
            ThreePointArc((84, 2), (86.828427125, 3.171572875), (88, 6))
            Line((88, 6), (88, 97.909963118))
            ThreePointArc((88, 97.909963118), (86.828427125, 100.738390242), (84, 101.909963118))
            Line((84, 101.909963118), (-84, 101.909963118))
            ThreePointArc((-84, 101.909963118), (-86.828427125, 100.738390242), (-88, 97.909963118))
        make_face()
        with BuildLine():
            Line((84, 101.409963118), (-84, 101.409963118))
            ThreePointArc((-84, 101.409963118), (-86.474873734, 100.384836852), (-87.5, 97.909963118))
            Line((-87.5, 97.909963118), (-87.5, 6))
            ThreePointArc((-87.5, 6), (-86.474873734, 3.525126266), (-84, 2.5))
            Line((-84, 2.5), (84, 2.5))
            ThreePointArc((84, 2.5), (86.474873734, 3.525126266), (87.5, 6))
            Line((87.5, 6), (87.5, 97.909963118))
            ThreePointArc((87.5, 97.909963118), (86.474873734, 100.384836852), (84, 101.409963118))
        make_face(mode=Mode.SUBTRACT)
    extrude(amount=BOSS_EXTRUDE8_DEPTH)

    # Sketch27 → Boss-Extrude10 (add)
    with BuildSketch(Plane.XY.offset(-64)):
        with BuildLine():
            Line((-87.5, 97.409963118), (-87.5, 6.5))
            ThreePointArc((-87.5, 6.5), (-86.328427125, 3.671572875), (-83.5, 2.5))
            Line((-83.5, 2.5), (83.498076121, 2.5))
            ThreePointArc((83.498076121, 2.5), (86.327863634, 3.672136366), (87.5, 6.501923879))
            Line((87.5, 6.501923879), (87.5, 97.409963118))
            ThreePointArc((87.5, 97.409963118), (86.328427125, 100.238390242), (83.5, 101.409963118))
            Line((83.5, 101.409963118), (-83.5, 101.409963118))
            ThreePointArc((-83.5, 101.409963118), (-86.328427125, 100.238390242), (-87.5, 97.409963118))
        make_face()
        with BuildLine():
            Line((83.5, 98.409963118), (-83.5, 98.409963118))
            ThreePointArc((-83.5, 98.409963118), (-84.207106781, 98.117069899), (-84.5, 97.409963118))
            Line((-84.5, 97.409963118), (-84.5, 6.5))
            ThreePointArc((-84.5, 6.5), (-84.207106781, 5.792893219), (-83.5, 5.5))
            Line((-83.5, 5.5), (83.498076121, 5.5))
            ThreePointArc((83.498076121, 5.5), (84.20654329, 5.79345671), (84.5, 6.501923879))
            Line((84.5, 6.501923879), (84.5, 97.409963118))
            ThreePointArc((84.5, 97.409963118), (84.207106781, 98.117069899), (83.5, 98.409963118))
        make_face(mode=Mode.SUBTRACT)
    extrude(amount=BOSS_EXTRUDE10_DEPTH)

    # Boss-Extrude12 outline → Boss-Extrude12 (add)
    with BuildSketch(Plane.XY.offset(-60.5).offset(BOSS_EXTRUDE12_START)):
        with BuildLine():
            Line((82.5, 98.409963118), (82.5, 96.409963118))
            Line((82.5, 96.409963118), (84.5, 96.409963118))
            Line((84.5, 96.409963118), (84.5, 97.409963118))
            ThreePointArc((84.5, 97.409963118), (84.207106781, 98.117069899), (83.5, 98.409963118))
            Line((83.5, 98.409963118), (82.5, 98.409963118))
        make_face()
        with BuildLine():
            Line((84, 101.409963118), (83.5, 101.409963118))
            ThreePointArc((83.5, 101.409963118), (86.328427125, 100.238390242), (87.5, 97.409963118))
            Line((87.5, 97.409963118), (87.5, 97.909963118))
            ThreePointArc((87.5, 97.909963118), (86.474873734, 100.384836852), (84, 101.409963118))
        make_face()
    extrude(amount=BOSS_EXTRUDE12_DEPTH)

    # Sketch30 → Cut-Extrude21 (cut)
    with BuildSketch(Plane.XY.offset(-60.5)):
        Polygon((82.5, 96.409963118), (82.5, 98.409963118), (82, 98.409963118), (82, 104.702751436), (91.573615081, 104.702751436), (91.845206998, 95.909963118), (87.5, 95.909963118), (84.5, 95.909963118), (84.5, 96.409963118), align=None)
    extrude(amount=CUT_EXTRUDE21_DEPTH, mode=Mode.SUBTRACT)

    # Sketch31 → Cut-Extrude22 (cut)
    with BuildSketch(Plane.XY.offset(-60.5)):
        with Locations((85.55, 99.459963118)):
            Circle(SKETCH31_R)
    extrude(amount=-CUT_EXTRUDE22_DEPTH, mode=Mode.SUBTRACT)

    # Fillet11
    fillet11_edges = [part.edges().sort_by_distance(p)[0] for p in [
        (82.5, 96.409963118, -62.25),
    ]]
    fillet(fillet11_edges, radius=FILLET11_R)

    # Sketch32 → Cut-Extrude23 (cut)
    with BuildSketch(Plane(origin=(0, 0, -66), x_dir=(-1, 0, 0), z_dir=(0, 0, -1))):
        with Locations((65.847456736, 24.152543264)):
            Circle(SKETCH32_R)
    extrude(amount=-CUT_EXTRUDE23_DEPTH, mode=Mode.SUBTRACT)


solid = part.part
